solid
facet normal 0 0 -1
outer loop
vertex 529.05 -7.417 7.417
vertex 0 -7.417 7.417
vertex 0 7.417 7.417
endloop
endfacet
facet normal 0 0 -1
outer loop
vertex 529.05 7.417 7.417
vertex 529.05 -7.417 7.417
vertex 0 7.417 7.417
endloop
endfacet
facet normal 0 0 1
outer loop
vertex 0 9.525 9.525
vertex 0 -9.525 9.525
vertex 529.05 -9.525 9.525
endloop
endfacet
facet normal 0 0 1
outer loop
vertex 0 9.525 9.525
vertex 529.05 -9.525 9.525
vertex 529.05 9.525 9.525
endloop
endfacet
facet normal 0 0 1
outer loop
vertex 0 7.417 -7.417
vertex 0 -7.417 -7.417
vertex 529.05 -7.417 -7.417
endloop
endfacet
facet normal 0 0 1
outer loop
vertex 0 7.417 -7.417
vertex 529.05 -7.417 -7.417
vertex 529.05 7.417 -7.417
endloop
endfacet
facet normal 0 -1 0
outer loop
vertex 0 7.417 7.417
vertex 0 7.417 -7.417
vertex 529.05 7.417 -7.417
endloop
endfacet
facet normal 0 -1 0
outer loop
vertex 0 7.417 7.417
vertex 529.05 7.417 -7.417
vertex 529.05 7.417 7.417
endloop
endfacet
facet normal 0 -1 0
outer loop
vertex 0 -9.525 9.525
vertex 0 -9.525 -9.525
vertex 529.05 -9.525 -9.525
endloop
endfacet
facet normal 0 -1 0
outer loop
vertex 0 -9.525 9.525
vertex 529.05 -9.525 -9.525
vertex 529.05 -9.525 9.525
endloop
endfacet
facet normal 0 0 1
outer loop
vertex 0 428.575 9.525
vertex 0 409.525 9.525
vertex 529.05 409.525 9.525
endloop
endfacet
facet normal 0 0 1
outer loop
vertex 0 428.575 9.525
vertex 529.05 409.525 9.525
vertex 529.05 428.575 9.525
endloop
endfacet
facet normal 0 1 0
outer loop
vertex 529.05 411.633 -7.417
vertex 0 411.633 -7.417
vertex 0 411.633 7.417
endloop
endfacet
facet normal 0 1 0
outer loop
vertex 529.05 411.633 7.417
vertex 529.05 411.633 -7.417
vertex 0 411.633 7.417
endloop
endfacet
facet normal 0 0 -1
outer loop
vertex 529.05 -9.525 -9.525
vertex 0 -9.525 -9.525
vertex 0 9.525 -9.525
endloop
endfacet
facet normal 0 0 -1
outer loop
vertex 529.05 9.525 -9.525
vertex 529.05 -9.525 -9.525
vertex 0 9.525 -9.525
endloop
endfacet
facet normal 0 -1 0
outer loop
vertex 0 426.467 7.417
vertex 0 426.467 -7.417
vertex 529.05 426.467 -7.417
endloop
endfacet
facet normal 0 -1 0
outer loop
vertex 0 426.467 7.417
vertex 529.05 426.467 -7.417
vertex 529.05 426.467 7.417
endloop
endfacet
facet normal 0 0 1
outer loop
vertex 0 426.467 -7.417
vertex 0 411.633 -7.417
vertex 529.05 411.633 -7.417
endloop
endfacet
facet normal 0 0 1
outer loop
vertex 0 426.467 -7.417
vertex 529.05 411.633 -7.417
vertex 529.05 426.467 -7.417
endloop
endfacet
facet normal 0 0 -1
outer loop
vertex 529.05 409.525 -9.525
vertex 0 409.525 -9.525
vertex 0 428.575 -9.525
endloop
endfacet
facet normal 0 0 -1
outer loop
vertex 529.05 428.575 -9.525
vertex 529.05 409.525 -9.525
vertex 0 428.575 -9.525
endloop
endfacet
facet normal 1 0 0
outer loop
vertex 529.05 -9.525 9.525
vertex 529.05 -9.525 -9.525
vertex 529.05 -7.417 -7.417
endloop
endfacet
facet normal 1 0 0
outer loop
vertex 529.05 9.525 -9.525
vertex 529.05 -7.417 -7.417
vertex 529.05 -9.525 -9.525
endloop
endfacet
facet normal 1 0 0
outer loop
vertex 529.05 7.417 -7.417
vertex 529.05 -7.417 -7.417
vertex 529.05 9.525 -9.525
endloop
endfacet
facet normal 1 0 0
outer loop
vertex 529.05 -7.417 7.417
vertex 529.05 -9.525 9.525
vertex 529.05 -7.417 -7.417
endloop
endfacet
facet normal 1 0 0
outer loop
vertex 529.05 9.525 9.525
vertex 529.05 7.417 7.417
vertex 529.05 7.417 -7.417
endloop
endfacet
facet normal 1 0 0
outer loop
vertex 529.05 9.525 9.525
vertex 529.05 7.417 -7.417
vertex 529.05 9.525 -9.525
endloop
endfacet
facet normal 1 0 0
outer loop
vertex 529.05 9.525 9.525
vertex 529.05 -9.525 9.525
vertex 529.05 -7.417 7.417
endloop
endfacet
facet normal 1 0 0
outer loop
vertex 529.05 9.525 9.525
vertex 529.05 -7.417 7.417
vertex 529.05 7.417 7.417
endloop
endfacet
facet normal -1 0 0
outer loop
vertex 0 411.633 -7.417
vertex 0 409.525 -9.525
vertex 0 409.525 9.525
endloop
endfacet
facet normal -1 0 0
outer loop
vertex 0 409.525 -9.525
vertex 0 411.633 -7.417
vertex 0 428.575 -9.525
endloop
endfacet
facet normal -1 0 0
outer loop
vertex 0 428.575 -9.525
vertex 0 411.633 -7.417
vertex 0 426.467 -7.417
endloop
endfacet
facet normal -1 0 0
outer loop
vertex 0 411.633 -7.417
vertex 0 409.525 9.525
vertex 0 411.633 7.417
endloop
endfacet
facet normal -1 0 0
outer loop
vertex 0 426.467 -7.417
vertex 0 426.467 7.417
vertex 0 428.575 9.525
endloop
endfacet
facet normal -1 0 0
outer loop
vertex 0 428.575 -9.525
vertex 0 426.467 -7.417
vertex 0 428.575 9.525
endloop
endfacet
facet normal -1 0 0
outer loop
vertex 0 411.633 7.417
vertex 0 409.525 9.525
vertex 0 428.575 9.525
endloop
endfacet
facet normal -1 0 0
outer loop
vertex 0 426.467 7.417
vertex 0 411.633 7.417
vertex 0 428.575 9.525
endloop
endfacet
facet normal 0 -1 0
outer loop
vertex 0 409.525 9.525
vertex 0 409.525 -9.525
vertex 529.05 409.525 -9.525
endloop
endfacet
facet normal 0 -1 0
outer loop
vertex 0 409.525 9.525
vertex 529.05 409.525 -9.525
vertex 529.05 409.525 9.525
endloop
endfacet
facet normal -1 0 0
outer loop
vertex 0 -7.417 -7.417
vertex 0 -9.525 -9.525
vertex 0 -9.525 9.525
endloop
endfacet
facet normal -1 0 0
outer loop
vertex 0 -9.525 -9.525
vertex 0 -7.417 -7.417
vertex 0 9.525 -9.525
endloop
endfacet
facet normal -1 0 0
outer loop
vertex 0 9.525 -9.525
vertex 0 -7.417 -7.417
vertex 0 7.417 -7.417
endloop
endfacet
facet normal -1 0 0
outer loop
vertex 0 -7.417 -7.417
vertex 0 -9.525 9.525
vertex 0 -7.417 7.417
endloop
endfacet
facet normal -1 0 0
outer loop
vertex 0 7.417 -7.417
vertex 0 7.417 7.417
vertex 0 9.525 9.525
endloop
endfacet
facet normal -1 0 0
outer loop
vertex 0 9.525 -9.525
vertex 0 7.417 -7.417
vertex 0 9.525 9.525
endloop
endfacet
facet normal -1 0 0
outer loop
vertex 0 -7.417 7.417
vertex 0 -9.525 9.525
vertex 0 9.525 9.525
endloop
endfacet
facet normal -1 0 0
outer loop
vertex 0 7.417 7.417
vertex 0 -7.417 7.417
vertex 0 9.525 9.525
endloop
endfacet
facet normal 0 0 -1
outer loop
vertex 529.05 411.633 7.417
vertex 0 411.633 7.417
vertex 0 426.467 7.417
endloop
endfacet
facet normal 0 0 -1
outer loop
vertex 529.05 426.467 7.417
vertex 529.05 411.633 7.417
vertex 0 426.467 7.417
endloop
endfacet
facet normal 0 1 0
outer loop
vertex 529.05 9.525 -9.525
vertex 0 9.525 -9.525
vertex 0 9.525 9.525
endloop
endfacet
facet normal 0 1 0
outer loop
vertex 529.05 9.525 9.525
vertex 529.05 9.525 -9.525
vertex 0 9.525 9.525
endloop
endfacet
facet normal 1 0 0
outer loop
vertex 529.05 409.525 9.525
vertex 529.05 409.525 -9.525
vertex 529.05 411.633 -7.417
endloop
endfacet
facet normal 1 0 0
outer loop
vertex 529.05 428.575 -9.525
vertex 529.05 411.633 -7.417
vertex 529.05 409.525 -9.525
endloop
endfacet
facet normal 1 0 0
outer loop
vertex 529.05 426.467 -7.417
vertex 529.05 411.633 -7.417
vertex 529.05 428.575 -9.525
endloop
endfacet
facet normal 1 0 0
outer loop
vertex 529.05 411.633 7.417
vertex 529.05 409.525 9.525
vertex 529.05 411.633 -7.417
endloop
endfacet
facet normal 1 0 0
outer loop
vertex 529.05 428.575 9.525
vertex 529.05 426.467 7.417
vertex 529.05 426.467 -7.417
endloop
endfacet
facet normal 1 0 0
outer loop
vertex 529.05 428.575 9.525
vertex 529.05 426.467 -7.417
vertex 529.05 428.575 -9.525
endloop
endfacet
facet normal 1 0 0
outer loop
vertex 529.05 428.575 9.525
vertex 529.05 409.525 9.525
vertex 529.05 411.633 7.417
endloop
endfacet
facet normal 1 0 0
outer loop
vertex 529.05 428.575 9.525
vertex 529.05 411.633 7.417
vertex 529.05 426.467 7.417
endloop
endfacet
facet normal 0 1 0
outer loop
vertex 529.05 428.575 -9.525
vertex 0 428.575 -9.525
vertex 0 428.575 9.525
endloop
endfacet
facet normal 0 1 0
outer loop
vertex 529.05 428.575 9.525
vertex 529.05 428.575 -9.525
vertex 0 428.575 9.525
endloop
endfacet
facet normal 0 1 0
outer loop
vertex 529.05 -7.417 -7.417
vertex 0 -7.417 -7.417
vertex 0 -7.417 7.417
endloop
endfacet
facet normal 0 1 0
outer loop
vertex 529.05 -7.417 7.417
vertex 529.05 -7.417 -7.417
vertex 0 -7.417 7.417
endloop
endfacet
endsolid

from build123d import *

# Parameters (mm, degrees)
SKETCH11_W                                    = 19.05
SKETCH11_H                                    = 19.05
SKETCH11_W_2                                  = 14.8336
SKETCH11_H_2                                  = 14.8336
AL_TUBE_SQUARE_AL_TUBE_0_75_SQR_X_0_083_DEPTH = 529.05
SKETCH11_ON_SEGMENT_2_W                       = 19.05
SKETCH11_ON_SEGMENT_2_H                       = 19.05
SKETCH11_ON_SEGMENT_2_W_2                     = 14.8336
SKETCH11_ON_SEGMENT_2_H_2                     = 14.8336
AL_TUBE_SQUARE_AL_TUBE_0_75_SQR_X_0_2_DEPTH   = 529.05


with BuildPart() as part:
    # Sketch11 → Al tube square AL TUBE 0.75 SQR X 0.083 WALL(1) (new body)
    with BuildSketch(Plane(origin=(0, 419.05, 0), x_dir=(0, 1, 0), z_dir=(1, 0, 0))):
        Rectangle(SKETCH11_W, SKETCH11_H)
        Rectangle(SKETCH11_W_2, SKETCH11_H_2, mode=Mode.SUBTRACT)
    extrude(amount=AL_TUBE_SQUARE_AL_TUBE_0_75_SQR_X_0_083_DEPTH)


with BuildPart() as body_2:
    # Sketch11 on segment 2 (carried to segment 2) → Al tube square AL TUBE 0.75 SQR X 0. 2 (new body)
    with BuildSketch(Plane.YZ):
        Rectangle(SKETCH11_ON_SEGMENT_2_W, SKETCH11_ON_SEGMENT_2_H)
        Rectangle(SKETCH11_ON_SEGMENT_2_W_2, SKETCH11_ON_SEGMENT_2_H_2, mode=Mode.SUBTRACT)
    extrude(amount=AL_TUBE_SQUARE_AL_TUBE_0_75_SQR_X_0_2_DEPTH)


solid = Compound([part.part, body_2.part])
